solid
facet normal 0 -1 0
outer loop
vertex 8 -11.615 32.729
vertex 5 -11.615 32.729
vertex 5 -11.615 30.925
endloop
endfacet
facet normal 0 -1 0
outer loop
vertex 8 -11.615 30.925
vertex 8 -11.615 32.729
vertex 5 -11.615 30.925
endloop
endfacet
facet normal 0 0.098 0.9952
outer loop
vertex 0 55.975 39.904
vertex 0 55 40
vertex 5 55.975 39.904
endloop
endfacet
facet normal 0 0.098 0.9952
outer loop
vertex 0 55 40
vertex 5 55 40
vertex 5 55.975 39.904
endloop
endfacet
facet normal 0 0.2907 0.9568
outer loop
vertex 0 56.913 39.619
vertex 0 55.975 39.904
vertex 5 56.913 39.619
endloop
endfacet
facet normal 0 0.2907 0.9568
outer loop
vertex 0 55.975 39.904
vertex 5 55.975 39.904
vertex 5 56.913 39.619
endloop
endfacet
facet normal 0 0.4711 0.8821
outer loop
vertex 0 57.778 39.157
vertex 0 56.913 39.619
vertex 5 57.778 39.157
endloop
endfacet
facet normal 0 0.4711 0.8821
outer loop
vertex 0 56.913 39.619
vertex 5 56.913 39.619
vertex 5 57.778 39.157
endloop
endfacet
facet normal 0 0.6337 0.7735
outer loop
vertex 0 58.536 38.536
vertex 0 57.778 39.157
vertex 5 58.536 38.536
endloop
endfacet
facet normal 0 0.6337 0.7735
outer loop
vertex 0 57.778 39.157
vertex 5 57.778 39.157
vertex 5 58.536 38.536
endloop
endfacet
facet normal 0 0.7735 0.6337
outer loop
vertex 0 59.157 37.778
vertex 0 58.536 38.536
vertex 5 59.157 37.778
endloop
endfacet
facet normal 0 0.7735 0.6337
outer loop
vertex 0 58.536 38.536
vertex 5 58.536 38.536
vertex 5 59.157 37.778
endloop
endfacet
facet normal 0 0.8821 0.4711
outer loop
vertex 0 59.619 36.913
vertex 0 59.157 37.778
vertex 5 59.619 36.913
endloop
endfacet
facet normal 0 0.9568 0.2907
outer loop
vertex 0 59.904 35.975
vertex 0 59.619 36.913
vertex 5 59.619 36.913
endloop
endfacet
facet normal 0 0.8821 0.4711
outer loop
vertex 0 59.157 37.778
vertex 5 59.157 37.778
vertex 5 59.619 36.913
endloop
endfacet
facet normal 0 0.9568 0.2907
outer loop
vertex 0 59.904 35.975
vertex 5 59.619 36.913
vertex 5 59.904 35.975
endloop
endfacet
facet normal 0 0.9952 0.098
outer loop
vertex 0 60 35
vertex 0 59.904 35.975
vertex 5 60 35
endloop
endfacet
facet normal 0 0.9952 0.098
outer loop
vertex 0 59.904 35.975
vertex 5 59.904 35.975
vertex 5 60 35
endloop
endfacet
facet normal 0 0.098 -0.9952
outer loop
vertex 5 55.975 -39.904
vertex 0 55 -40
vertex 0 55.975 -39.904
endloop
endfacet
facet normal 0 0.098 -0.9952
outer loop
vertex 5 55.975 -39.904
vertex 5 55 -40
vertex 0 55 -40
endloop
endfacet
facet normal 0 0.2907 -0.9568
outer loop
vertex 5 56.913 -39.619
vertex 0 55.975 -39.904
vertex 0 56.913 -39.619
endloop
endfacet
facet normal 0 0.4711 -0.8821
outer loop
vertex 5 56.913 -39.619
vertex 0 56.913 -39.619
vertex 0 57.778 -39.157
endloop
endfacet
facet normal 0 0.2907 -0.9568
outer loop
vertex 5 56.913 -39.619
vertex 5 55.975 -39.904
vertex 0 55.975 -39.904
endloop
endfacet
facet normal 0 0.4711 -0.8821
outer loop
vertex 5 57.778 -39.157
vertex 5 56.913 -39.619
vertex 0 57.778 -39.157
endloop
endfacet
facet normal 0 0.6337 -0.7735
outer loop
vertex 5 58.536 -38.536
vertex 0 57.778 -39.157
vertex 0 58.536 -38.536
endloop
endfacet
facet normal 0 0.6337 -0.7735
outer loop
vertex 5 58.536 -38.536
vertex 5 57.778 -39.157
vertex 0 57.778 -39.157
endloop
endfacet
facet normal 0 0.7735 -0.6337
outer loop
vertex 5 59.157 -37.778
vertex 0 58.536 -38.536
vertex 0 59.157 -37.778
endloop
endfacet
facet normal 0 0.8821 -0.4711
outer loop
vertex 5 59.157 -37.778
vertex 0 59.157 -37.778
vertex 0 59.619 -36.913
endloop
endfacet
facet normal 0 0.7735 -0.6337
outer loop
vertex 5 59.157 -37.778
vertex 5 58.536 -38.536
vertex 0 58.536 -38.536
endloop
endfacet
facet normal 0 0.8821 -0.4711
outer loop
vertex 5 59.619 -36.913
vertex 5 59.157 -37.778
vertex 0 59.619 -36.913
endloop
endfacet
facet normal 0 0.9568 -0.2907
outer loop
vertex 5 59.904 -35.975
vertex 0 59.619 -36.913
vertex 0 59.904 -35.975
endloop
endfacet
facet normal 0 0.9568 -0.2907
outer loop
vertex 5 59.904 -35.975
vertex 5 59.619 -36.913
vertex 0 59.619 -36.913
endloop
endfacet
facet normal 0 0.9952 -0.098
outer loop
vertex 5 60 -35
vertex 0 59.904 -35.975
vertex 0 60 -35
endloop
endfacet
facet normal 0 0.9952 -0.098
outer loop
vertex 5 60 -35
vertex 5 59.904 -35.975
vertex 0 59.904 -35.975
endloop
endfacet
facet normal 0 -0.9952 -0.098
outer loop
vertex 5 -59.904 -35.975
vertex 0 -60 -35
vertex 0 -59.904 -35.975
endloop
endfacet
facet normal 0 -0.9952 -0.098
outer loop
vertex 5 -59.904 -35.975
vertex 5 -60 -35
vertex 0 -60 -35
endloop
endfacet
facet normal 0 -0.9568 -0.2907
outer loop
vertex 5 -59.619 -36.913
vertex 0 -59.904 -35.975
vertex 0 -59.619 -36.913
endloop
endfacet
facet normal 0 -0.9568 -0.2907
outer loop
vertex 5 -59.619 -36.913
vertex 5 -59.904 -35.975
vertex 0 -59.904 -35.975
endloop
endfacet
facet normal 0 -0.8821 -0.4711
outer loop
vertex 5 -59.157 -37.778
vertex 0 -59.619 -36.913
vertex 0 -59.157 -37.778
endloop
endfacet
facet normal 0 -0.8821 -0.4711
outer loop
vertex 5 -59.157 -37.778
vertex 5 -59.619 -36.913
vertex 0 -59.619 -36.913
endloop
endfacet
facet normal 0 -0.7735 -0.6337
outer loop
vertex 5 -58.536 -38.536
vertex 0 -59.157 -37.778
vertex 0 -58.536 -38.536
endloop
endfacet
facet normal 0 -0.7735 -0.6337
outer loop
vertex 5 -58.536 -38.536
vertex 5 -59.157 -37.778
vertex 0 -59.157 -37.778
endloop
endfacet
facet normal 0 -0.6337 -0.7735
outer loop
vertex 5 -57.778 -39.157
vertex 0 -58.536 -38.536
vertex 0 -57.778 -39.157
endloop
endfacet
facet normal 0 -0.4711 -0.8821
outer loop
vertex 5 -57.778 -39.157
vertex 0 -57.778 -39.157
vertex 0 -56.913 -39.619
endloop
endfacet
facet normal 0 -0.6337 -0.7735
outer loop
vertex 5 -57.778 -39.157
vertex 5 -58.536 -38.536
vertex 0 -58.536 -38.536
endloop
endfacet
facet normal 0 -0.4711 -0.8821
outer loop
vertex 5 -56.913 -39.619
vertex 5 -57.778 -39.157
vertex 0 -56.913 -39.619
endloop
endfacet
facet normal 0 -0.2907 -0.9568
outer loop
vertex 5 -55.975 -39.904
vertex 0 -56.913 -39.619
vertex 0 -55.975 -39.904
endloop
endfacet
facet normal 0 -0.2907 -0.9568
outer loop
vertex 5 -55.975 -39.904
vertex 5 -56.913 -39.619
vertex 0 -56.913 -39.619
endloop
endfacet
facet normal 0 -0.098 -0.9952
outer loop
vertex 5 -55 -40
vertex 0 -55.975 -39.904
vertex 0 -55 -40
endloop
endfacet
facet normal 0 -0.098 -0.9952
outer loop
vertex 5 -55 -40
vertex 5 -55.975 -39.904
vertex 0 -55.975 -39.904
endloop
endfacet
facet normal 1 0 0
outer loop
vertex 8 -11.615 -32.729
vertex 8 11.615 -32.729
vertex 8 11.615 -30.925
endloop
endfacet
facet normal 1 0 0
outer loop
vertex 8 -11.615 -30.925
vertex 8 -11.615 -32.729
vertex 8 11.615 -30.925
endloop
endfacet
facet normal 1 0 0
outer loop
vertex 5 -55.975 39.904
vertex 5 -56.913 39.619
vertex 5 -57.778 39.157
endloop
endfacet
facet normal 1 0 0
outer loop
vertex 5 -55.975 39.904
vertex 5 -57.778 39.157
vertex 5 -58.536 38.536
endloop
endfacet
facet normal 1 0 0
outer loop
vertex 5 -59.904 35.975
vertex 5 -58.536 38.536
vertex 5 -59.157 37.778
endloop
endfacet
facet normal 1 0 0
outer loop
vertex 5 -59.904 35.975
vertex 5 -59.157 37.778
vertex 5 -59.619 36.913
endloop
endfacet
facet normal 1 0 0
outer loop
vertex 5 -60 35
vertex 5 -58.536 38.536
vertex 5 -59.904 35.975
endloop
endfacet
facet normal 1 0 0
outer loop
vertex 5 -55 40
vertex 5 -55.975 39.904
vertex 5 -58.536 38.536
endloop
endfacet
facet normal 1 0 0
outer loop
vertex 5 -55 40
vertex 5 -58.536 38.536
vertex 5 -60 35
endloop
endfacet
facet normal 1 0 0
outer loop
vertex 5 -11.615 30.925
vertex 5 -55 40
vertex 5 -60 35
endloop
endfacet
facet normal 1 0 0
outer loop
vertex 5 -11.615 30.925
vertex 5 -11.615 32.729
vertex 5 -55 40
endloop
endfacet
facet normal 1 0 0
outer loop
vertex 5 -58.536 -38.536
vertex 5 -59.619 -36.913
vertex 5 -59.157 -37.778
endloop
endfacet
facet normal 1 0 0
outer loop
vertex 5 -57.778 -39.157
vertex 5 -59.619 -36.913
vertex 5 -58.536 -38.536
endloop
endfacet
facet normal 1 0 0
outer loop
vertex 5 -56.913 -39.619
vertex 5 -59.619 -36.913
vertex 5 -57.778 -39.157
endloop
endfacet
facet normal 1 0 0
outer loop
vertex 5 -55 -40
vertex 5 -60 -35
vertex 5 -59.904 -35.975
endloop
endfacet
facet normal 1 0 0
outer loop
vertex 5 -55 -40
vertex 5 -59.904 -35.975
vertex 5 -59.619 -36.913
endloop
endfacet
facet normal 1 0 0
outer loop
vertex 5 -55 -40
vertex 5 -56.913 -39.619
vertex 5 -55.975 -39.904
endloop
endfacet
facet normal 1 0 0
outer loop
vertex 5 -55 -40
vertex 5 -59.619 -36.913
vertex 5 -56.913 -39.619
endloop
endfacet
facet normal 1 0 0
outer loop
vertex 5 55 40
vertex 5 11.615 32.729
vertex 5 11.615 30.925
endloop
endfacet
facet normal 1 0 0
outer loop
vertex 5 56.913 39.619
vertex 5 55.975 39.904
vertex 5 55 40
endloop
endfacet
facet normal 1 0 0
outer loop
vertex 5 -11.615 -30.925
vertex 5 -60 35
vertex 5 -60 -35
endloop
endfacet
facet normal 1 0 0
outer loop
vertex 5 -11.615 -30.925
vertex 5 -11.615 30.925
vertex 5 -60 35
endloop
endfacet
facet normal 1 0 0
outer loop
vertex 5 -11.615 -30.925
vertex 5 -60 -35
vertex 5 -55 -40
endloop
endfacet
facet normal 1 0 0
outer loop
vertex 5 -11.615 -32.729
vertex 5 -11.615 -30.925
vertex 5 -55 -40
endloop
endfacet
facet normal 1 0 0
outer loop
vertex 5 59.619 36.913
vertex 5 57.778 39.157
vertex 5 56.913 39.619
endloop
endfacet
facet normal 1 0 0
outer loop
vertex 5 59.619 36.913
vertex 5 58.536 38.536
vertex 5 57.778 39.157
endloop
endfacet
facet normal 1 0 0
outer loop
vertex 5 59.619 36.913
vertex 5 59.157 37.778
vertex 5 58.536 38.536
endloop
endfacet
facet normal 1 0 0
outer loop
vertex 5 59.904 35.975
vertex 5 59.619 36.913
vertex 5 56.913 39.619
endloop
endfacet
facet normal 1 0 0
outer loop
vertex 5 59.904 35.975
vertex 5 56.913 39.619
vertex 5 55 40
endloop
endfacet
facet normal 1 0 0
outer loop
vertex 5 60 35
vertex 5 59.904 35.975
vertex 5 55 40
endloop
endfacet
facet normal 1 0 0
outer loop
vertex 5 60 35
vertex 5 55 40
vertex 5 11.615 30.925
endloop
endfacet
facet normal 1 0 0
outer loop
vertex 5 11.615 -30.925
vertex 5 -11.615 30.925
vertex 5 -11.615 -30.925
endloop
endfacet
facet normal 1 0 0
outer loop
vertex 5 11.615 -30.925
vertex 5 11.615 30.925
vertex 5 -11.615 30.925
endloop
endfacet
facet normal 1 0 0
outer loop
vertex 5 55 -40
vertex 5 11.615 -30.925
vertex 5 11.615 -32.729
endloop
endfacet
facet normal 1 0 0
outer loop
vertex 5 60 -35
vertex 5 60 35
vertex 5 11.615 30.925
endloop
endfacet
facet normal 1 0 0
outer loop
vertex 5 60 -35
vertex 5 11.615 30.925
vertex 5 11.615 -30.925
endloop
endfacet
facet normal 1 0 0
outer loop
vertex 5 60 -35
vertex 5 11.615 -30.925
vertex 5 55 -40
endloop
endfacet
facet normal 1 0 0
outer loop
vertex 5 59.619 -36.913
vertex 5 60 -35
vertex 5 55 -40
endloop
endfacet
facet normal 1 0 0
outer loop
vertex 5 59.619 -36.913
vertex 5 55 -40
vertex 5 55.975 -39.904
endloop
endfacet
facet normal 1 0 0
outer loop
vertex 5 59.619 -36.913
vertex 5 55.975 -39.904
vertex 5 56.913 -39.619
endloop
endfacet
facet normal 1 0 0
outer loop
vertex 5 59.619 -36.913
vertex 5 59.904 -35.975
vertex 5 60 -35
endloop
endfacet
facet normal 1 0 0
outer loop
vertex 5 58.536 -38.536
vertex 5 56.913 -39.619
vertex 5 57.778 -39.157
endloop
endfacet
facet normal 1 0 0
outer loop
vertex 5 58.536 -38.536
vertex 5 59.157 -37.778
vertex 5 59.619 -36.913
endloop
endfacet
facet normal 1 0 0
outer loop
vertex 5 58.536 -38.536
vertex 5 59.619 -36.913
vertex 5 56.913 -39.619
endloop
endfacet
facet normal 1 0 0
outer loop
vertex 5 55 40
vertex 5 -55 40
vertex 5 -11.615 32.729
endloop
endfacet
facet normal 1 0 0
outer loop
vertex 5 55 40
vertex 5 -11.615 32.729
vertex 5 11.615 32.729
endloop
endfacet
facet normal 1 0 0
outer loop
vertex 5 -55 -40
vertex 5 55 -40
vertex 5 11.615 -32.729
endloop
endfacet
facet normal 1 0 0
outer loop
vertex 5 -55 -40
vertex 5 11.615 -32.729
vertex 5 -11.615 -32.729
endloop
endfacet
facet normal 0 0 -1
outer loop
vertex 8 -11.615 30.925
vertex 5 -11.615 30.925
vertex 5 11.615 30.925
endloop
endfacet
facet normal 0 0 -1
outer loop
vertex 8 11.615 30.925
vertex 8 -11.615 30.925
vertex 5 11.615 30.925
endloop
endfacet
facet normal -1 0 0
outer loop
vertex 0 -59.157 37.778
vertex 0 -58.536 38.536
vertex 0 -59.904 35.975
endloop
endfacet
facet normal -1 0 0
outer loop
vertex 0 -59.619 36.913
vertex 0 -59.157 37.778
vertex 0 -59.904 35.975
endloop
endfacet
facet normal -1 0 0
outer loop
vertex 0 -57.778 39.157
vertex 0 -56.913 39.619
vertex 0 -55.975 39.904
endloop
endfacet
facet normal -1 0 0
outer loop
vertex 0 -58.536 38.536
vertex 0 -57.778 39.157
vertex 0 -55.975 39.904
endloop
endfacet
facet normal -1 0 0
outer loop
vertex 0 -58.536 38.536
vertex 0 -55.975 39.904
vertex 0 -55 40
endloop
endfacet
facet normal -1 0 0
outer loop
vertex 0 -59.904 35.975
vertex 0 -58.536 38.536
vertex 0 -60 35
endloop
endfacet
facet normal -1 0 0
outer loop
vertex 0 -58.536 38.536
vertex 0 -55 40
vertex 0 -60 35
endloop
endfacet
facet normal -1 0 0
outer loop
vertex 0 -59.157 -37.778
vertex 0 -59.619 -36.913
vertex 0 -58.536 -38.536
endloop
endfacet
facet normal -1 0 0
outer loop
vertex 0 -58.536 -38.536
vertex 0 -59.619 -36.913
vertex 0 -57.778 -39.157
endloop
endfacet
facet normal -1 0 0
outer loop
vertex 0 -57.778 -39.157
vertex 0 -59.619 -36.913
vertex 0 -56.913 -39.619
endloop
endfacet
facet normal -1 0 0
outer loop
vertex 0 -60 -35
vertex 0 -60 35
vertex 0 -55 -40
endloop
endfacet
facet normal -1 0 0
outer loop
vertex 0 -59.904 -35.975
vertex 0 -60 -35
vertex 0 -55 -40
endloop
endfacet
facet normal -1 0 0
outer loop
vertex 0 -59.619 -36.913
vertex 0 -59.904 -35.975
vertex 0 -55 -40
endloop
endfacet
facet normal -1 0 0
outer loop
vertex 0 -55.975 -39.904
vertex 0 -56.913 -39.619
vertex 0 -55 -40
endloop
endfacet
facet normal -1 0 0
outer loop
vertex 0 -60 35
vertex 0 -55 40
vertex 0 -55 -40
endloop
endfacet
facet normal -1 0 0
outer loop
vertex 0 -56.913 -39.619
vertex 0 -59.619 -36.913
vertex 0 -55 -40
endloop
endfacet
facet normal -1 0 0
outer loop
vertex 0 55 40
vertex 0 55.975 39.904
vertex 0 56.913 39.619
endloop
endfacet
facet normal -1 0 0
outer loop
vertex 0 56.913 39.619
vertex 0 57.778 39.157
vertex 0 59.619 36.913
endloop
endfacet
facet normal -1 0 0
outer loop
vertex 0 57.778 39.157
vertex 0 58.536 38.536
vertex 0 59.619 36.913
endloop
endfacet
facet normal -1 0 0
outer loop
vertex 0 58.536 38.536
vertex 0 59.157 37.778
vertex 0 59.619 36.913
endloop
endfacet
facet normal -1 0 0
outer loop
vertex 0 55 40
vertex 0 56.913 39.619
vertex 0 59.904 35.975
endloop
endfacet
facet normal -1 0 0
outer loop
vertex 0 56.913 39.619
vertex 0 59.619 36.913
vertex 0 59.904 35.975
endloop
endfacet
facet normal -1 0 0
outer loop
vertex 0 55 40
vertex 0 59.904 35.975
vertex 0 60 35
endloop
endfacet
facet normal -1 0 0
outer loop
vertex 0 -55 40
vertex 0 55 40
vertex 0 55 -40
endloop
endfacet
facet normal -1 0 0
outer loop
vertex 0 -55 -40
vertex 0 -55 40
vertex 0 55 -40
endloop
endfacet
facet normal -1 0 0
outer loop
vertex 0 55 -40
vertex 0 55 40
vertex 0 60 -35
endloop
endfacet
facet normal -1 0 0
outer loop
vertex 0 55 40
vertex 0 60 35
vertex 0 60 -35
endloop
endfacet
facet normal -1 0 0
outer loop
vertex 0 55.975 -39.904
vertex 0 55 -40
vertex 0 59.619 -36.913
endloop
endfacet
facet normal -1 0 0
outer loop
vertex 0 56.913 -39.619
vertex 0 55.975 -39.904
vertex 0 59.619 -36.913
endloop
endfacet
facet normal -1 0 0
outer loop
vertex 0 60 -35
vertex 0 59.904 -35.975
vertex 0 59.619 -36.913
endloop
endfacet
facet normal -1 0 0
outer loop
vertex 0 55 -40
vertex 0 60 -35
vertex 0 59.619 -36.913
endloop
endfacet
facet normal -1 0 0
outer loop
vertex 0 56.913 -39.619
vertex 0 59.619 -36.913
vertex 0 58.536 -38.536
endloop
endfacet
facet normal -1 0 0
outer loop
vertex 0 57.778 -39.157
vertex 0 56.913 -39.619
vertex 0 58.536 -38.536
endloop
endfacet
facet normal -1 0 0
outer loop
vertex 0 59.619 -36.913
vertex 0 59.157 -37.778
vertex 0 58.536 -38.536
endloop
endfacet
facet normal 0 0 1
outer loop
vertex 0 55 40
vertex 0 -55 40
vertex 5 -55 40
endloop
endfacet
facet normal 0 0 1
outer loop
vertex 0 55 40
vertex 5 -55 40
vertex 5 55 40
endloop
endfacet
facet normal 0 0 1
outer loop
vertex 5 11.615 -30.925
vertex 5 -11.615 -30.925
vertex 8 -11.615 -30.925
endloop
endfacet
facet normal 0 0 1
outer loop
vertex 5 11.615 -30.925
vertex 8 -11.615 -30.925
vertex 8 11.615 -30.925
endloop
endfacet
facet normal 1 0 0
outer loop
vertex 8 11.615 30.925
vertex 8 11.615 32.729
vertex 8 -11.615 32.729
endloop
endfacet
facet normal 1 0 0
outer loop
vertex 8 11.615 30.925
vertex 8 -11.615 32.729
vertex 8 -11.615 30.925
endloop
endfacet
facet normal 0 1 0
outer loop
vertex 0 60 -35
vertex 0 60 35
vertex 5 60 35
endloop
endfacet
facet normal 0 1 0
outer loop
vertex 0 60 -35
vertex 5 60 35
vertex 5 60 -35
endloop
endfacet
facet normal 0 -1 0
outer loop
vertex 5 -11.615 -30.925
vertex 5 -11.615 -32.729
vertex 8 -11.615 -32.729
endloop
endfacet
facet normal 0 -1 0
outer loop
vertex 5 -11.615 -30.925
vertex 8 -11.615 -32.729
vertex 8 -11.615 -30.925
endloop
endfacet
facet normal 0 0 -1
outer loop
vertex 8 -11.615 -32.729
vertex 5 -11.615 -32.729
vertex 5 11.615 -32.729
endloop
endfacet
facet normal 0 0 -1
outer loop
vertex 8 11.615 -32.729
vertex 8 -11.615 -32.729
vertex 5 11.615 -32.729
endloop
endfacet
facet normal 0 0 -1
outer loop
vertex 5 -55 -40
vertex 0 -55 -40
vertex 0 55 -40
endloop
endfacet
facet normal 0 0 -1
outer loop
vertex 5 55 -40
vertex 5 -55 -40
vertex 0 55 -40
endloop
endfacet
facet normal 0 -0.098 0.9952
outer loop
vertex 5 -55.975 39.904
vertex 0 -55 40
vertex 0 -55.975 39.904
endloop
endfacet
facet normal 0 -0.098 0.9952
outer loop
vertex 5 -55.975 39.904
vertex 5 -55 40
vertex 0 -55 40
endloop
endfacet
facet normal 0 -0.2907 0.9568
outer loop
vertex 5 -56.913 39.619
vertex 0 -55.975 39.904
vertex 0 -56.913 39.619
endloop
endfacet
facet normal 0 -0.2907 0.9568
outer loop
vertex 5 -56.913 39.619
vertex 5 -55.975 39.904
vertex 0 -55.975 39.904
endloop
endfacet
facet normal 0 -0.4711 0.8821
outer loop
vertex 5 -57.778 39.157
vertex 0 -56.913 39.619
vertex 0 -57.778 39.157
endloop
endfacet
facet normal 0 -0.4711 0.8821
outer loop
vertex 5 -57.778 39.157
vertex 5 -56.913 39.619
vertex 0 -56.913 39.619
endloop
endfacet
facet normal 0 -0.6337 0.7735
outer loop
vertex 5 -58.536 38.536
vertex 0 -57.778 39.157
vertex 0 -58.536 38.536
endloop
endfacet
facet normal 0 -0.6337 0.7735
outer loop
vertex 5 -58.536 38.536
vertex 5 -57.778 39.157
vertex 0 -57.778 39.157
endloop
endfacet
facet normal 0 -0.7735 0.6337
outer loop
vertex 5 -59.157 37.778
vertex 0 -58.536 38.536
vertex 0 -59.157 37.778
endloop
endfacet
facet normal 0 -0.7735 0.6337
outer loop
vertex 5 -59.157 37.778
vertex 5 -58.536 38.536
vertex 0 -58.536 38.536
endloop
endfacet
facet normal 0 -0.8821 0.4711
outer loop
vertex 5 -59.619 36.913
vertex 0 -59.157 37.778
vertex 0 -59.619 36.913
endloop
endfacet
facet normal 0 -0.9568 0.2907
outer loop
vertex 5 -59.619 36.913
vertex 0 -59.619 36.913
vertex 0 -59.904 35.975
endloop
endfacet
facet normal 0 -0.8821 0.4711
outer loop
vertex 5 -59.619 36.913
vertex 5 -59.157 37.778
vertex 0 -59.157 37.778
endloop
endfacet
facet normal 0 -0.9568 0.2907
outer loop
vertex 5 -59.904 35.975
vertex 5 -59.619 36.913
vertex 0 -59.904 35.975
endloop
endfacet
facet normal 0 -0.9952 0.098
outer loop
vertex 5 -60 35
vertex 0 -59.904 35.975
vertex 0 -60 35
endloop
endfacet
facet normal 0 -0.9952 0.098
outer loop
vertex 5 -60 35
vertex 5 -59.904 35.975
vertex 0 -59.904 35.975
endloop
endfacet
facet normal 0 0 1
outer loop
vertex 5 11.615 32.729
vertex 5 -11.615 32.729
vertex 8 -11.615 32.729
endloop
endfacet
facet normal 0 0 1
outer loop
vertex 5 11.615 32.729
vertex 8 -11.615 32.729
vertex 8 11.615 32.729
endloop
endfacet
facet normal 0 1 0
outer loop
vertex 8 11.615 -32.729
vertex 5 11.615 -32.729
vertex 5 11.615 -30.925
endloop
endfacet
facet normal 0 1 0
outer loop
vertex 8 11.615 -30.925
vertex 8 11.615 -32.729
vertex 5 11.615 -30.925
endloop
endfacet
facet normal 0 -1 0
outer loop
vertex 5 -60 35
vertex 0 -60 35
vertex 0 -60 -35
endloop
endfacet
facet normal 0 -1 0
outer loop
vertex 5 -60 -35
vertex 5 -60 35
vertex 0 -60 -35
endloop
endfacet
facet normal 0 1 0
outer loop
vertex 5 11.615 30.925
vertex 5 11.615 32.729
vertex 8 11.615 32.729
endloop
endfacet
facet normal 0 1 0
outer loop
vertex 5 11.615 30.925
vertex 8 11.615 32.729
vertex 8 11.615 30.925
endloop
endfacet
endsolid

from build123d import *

# Parameters (mm, degrees)
SKETCH1_W           = 80
SKETCH1_H           = 120
BOSS_EXTRUDE1_DEPTH = 5
FILLET1_R           = 5
SKETCH2_W           = 1.804418344
SKETCH2_H           = 23.230636126
BOSS_EXTRUDE2_DEPTH = 3


with BuildPart() as part:
    # Sketch1 → Boss-Extrude1 (new body)
    with BuildSketch(Plane(origin=(0, 0, 0), x_dir=(0, 0, -1), z_dir=(1, 0, 0))):
        Rectangle(SKETCH1_W, SKETCH1_H)
    extrude(amount=BOSS_EXTRUDE1_DEPTH)

    # Fillet1
    fillet1_edges = [part.edges().sort_by_distance(p)[0] for p in [
        (2.5, -60, -40),
        (2.5, -60, 40),
        (2.5, 60, 40),
        (2.5, 60, -40),
    ]]
    fillet(fillet1_edges, radius=FILLET1_R)

    # Sketch2 → Boss-Extrude2 (add)
    with BuildSketch(Plane(origin=(5, 0, 0), x_dir=(0, 0, -1), z_dir=(1, 0, 0))):
        with Locations((-31.82671961, 0)):
            Rectangle(SKETCH2_W, SKETCH2_H)
    boss_extrude2 = extrude(amount=BOSS_EXTRUDE2_DEPTH)

    # Mirror1: Boss-Extrude2 across plane
    add(boss_extrude2.mirror(Plane.XY))


solid = part.part
